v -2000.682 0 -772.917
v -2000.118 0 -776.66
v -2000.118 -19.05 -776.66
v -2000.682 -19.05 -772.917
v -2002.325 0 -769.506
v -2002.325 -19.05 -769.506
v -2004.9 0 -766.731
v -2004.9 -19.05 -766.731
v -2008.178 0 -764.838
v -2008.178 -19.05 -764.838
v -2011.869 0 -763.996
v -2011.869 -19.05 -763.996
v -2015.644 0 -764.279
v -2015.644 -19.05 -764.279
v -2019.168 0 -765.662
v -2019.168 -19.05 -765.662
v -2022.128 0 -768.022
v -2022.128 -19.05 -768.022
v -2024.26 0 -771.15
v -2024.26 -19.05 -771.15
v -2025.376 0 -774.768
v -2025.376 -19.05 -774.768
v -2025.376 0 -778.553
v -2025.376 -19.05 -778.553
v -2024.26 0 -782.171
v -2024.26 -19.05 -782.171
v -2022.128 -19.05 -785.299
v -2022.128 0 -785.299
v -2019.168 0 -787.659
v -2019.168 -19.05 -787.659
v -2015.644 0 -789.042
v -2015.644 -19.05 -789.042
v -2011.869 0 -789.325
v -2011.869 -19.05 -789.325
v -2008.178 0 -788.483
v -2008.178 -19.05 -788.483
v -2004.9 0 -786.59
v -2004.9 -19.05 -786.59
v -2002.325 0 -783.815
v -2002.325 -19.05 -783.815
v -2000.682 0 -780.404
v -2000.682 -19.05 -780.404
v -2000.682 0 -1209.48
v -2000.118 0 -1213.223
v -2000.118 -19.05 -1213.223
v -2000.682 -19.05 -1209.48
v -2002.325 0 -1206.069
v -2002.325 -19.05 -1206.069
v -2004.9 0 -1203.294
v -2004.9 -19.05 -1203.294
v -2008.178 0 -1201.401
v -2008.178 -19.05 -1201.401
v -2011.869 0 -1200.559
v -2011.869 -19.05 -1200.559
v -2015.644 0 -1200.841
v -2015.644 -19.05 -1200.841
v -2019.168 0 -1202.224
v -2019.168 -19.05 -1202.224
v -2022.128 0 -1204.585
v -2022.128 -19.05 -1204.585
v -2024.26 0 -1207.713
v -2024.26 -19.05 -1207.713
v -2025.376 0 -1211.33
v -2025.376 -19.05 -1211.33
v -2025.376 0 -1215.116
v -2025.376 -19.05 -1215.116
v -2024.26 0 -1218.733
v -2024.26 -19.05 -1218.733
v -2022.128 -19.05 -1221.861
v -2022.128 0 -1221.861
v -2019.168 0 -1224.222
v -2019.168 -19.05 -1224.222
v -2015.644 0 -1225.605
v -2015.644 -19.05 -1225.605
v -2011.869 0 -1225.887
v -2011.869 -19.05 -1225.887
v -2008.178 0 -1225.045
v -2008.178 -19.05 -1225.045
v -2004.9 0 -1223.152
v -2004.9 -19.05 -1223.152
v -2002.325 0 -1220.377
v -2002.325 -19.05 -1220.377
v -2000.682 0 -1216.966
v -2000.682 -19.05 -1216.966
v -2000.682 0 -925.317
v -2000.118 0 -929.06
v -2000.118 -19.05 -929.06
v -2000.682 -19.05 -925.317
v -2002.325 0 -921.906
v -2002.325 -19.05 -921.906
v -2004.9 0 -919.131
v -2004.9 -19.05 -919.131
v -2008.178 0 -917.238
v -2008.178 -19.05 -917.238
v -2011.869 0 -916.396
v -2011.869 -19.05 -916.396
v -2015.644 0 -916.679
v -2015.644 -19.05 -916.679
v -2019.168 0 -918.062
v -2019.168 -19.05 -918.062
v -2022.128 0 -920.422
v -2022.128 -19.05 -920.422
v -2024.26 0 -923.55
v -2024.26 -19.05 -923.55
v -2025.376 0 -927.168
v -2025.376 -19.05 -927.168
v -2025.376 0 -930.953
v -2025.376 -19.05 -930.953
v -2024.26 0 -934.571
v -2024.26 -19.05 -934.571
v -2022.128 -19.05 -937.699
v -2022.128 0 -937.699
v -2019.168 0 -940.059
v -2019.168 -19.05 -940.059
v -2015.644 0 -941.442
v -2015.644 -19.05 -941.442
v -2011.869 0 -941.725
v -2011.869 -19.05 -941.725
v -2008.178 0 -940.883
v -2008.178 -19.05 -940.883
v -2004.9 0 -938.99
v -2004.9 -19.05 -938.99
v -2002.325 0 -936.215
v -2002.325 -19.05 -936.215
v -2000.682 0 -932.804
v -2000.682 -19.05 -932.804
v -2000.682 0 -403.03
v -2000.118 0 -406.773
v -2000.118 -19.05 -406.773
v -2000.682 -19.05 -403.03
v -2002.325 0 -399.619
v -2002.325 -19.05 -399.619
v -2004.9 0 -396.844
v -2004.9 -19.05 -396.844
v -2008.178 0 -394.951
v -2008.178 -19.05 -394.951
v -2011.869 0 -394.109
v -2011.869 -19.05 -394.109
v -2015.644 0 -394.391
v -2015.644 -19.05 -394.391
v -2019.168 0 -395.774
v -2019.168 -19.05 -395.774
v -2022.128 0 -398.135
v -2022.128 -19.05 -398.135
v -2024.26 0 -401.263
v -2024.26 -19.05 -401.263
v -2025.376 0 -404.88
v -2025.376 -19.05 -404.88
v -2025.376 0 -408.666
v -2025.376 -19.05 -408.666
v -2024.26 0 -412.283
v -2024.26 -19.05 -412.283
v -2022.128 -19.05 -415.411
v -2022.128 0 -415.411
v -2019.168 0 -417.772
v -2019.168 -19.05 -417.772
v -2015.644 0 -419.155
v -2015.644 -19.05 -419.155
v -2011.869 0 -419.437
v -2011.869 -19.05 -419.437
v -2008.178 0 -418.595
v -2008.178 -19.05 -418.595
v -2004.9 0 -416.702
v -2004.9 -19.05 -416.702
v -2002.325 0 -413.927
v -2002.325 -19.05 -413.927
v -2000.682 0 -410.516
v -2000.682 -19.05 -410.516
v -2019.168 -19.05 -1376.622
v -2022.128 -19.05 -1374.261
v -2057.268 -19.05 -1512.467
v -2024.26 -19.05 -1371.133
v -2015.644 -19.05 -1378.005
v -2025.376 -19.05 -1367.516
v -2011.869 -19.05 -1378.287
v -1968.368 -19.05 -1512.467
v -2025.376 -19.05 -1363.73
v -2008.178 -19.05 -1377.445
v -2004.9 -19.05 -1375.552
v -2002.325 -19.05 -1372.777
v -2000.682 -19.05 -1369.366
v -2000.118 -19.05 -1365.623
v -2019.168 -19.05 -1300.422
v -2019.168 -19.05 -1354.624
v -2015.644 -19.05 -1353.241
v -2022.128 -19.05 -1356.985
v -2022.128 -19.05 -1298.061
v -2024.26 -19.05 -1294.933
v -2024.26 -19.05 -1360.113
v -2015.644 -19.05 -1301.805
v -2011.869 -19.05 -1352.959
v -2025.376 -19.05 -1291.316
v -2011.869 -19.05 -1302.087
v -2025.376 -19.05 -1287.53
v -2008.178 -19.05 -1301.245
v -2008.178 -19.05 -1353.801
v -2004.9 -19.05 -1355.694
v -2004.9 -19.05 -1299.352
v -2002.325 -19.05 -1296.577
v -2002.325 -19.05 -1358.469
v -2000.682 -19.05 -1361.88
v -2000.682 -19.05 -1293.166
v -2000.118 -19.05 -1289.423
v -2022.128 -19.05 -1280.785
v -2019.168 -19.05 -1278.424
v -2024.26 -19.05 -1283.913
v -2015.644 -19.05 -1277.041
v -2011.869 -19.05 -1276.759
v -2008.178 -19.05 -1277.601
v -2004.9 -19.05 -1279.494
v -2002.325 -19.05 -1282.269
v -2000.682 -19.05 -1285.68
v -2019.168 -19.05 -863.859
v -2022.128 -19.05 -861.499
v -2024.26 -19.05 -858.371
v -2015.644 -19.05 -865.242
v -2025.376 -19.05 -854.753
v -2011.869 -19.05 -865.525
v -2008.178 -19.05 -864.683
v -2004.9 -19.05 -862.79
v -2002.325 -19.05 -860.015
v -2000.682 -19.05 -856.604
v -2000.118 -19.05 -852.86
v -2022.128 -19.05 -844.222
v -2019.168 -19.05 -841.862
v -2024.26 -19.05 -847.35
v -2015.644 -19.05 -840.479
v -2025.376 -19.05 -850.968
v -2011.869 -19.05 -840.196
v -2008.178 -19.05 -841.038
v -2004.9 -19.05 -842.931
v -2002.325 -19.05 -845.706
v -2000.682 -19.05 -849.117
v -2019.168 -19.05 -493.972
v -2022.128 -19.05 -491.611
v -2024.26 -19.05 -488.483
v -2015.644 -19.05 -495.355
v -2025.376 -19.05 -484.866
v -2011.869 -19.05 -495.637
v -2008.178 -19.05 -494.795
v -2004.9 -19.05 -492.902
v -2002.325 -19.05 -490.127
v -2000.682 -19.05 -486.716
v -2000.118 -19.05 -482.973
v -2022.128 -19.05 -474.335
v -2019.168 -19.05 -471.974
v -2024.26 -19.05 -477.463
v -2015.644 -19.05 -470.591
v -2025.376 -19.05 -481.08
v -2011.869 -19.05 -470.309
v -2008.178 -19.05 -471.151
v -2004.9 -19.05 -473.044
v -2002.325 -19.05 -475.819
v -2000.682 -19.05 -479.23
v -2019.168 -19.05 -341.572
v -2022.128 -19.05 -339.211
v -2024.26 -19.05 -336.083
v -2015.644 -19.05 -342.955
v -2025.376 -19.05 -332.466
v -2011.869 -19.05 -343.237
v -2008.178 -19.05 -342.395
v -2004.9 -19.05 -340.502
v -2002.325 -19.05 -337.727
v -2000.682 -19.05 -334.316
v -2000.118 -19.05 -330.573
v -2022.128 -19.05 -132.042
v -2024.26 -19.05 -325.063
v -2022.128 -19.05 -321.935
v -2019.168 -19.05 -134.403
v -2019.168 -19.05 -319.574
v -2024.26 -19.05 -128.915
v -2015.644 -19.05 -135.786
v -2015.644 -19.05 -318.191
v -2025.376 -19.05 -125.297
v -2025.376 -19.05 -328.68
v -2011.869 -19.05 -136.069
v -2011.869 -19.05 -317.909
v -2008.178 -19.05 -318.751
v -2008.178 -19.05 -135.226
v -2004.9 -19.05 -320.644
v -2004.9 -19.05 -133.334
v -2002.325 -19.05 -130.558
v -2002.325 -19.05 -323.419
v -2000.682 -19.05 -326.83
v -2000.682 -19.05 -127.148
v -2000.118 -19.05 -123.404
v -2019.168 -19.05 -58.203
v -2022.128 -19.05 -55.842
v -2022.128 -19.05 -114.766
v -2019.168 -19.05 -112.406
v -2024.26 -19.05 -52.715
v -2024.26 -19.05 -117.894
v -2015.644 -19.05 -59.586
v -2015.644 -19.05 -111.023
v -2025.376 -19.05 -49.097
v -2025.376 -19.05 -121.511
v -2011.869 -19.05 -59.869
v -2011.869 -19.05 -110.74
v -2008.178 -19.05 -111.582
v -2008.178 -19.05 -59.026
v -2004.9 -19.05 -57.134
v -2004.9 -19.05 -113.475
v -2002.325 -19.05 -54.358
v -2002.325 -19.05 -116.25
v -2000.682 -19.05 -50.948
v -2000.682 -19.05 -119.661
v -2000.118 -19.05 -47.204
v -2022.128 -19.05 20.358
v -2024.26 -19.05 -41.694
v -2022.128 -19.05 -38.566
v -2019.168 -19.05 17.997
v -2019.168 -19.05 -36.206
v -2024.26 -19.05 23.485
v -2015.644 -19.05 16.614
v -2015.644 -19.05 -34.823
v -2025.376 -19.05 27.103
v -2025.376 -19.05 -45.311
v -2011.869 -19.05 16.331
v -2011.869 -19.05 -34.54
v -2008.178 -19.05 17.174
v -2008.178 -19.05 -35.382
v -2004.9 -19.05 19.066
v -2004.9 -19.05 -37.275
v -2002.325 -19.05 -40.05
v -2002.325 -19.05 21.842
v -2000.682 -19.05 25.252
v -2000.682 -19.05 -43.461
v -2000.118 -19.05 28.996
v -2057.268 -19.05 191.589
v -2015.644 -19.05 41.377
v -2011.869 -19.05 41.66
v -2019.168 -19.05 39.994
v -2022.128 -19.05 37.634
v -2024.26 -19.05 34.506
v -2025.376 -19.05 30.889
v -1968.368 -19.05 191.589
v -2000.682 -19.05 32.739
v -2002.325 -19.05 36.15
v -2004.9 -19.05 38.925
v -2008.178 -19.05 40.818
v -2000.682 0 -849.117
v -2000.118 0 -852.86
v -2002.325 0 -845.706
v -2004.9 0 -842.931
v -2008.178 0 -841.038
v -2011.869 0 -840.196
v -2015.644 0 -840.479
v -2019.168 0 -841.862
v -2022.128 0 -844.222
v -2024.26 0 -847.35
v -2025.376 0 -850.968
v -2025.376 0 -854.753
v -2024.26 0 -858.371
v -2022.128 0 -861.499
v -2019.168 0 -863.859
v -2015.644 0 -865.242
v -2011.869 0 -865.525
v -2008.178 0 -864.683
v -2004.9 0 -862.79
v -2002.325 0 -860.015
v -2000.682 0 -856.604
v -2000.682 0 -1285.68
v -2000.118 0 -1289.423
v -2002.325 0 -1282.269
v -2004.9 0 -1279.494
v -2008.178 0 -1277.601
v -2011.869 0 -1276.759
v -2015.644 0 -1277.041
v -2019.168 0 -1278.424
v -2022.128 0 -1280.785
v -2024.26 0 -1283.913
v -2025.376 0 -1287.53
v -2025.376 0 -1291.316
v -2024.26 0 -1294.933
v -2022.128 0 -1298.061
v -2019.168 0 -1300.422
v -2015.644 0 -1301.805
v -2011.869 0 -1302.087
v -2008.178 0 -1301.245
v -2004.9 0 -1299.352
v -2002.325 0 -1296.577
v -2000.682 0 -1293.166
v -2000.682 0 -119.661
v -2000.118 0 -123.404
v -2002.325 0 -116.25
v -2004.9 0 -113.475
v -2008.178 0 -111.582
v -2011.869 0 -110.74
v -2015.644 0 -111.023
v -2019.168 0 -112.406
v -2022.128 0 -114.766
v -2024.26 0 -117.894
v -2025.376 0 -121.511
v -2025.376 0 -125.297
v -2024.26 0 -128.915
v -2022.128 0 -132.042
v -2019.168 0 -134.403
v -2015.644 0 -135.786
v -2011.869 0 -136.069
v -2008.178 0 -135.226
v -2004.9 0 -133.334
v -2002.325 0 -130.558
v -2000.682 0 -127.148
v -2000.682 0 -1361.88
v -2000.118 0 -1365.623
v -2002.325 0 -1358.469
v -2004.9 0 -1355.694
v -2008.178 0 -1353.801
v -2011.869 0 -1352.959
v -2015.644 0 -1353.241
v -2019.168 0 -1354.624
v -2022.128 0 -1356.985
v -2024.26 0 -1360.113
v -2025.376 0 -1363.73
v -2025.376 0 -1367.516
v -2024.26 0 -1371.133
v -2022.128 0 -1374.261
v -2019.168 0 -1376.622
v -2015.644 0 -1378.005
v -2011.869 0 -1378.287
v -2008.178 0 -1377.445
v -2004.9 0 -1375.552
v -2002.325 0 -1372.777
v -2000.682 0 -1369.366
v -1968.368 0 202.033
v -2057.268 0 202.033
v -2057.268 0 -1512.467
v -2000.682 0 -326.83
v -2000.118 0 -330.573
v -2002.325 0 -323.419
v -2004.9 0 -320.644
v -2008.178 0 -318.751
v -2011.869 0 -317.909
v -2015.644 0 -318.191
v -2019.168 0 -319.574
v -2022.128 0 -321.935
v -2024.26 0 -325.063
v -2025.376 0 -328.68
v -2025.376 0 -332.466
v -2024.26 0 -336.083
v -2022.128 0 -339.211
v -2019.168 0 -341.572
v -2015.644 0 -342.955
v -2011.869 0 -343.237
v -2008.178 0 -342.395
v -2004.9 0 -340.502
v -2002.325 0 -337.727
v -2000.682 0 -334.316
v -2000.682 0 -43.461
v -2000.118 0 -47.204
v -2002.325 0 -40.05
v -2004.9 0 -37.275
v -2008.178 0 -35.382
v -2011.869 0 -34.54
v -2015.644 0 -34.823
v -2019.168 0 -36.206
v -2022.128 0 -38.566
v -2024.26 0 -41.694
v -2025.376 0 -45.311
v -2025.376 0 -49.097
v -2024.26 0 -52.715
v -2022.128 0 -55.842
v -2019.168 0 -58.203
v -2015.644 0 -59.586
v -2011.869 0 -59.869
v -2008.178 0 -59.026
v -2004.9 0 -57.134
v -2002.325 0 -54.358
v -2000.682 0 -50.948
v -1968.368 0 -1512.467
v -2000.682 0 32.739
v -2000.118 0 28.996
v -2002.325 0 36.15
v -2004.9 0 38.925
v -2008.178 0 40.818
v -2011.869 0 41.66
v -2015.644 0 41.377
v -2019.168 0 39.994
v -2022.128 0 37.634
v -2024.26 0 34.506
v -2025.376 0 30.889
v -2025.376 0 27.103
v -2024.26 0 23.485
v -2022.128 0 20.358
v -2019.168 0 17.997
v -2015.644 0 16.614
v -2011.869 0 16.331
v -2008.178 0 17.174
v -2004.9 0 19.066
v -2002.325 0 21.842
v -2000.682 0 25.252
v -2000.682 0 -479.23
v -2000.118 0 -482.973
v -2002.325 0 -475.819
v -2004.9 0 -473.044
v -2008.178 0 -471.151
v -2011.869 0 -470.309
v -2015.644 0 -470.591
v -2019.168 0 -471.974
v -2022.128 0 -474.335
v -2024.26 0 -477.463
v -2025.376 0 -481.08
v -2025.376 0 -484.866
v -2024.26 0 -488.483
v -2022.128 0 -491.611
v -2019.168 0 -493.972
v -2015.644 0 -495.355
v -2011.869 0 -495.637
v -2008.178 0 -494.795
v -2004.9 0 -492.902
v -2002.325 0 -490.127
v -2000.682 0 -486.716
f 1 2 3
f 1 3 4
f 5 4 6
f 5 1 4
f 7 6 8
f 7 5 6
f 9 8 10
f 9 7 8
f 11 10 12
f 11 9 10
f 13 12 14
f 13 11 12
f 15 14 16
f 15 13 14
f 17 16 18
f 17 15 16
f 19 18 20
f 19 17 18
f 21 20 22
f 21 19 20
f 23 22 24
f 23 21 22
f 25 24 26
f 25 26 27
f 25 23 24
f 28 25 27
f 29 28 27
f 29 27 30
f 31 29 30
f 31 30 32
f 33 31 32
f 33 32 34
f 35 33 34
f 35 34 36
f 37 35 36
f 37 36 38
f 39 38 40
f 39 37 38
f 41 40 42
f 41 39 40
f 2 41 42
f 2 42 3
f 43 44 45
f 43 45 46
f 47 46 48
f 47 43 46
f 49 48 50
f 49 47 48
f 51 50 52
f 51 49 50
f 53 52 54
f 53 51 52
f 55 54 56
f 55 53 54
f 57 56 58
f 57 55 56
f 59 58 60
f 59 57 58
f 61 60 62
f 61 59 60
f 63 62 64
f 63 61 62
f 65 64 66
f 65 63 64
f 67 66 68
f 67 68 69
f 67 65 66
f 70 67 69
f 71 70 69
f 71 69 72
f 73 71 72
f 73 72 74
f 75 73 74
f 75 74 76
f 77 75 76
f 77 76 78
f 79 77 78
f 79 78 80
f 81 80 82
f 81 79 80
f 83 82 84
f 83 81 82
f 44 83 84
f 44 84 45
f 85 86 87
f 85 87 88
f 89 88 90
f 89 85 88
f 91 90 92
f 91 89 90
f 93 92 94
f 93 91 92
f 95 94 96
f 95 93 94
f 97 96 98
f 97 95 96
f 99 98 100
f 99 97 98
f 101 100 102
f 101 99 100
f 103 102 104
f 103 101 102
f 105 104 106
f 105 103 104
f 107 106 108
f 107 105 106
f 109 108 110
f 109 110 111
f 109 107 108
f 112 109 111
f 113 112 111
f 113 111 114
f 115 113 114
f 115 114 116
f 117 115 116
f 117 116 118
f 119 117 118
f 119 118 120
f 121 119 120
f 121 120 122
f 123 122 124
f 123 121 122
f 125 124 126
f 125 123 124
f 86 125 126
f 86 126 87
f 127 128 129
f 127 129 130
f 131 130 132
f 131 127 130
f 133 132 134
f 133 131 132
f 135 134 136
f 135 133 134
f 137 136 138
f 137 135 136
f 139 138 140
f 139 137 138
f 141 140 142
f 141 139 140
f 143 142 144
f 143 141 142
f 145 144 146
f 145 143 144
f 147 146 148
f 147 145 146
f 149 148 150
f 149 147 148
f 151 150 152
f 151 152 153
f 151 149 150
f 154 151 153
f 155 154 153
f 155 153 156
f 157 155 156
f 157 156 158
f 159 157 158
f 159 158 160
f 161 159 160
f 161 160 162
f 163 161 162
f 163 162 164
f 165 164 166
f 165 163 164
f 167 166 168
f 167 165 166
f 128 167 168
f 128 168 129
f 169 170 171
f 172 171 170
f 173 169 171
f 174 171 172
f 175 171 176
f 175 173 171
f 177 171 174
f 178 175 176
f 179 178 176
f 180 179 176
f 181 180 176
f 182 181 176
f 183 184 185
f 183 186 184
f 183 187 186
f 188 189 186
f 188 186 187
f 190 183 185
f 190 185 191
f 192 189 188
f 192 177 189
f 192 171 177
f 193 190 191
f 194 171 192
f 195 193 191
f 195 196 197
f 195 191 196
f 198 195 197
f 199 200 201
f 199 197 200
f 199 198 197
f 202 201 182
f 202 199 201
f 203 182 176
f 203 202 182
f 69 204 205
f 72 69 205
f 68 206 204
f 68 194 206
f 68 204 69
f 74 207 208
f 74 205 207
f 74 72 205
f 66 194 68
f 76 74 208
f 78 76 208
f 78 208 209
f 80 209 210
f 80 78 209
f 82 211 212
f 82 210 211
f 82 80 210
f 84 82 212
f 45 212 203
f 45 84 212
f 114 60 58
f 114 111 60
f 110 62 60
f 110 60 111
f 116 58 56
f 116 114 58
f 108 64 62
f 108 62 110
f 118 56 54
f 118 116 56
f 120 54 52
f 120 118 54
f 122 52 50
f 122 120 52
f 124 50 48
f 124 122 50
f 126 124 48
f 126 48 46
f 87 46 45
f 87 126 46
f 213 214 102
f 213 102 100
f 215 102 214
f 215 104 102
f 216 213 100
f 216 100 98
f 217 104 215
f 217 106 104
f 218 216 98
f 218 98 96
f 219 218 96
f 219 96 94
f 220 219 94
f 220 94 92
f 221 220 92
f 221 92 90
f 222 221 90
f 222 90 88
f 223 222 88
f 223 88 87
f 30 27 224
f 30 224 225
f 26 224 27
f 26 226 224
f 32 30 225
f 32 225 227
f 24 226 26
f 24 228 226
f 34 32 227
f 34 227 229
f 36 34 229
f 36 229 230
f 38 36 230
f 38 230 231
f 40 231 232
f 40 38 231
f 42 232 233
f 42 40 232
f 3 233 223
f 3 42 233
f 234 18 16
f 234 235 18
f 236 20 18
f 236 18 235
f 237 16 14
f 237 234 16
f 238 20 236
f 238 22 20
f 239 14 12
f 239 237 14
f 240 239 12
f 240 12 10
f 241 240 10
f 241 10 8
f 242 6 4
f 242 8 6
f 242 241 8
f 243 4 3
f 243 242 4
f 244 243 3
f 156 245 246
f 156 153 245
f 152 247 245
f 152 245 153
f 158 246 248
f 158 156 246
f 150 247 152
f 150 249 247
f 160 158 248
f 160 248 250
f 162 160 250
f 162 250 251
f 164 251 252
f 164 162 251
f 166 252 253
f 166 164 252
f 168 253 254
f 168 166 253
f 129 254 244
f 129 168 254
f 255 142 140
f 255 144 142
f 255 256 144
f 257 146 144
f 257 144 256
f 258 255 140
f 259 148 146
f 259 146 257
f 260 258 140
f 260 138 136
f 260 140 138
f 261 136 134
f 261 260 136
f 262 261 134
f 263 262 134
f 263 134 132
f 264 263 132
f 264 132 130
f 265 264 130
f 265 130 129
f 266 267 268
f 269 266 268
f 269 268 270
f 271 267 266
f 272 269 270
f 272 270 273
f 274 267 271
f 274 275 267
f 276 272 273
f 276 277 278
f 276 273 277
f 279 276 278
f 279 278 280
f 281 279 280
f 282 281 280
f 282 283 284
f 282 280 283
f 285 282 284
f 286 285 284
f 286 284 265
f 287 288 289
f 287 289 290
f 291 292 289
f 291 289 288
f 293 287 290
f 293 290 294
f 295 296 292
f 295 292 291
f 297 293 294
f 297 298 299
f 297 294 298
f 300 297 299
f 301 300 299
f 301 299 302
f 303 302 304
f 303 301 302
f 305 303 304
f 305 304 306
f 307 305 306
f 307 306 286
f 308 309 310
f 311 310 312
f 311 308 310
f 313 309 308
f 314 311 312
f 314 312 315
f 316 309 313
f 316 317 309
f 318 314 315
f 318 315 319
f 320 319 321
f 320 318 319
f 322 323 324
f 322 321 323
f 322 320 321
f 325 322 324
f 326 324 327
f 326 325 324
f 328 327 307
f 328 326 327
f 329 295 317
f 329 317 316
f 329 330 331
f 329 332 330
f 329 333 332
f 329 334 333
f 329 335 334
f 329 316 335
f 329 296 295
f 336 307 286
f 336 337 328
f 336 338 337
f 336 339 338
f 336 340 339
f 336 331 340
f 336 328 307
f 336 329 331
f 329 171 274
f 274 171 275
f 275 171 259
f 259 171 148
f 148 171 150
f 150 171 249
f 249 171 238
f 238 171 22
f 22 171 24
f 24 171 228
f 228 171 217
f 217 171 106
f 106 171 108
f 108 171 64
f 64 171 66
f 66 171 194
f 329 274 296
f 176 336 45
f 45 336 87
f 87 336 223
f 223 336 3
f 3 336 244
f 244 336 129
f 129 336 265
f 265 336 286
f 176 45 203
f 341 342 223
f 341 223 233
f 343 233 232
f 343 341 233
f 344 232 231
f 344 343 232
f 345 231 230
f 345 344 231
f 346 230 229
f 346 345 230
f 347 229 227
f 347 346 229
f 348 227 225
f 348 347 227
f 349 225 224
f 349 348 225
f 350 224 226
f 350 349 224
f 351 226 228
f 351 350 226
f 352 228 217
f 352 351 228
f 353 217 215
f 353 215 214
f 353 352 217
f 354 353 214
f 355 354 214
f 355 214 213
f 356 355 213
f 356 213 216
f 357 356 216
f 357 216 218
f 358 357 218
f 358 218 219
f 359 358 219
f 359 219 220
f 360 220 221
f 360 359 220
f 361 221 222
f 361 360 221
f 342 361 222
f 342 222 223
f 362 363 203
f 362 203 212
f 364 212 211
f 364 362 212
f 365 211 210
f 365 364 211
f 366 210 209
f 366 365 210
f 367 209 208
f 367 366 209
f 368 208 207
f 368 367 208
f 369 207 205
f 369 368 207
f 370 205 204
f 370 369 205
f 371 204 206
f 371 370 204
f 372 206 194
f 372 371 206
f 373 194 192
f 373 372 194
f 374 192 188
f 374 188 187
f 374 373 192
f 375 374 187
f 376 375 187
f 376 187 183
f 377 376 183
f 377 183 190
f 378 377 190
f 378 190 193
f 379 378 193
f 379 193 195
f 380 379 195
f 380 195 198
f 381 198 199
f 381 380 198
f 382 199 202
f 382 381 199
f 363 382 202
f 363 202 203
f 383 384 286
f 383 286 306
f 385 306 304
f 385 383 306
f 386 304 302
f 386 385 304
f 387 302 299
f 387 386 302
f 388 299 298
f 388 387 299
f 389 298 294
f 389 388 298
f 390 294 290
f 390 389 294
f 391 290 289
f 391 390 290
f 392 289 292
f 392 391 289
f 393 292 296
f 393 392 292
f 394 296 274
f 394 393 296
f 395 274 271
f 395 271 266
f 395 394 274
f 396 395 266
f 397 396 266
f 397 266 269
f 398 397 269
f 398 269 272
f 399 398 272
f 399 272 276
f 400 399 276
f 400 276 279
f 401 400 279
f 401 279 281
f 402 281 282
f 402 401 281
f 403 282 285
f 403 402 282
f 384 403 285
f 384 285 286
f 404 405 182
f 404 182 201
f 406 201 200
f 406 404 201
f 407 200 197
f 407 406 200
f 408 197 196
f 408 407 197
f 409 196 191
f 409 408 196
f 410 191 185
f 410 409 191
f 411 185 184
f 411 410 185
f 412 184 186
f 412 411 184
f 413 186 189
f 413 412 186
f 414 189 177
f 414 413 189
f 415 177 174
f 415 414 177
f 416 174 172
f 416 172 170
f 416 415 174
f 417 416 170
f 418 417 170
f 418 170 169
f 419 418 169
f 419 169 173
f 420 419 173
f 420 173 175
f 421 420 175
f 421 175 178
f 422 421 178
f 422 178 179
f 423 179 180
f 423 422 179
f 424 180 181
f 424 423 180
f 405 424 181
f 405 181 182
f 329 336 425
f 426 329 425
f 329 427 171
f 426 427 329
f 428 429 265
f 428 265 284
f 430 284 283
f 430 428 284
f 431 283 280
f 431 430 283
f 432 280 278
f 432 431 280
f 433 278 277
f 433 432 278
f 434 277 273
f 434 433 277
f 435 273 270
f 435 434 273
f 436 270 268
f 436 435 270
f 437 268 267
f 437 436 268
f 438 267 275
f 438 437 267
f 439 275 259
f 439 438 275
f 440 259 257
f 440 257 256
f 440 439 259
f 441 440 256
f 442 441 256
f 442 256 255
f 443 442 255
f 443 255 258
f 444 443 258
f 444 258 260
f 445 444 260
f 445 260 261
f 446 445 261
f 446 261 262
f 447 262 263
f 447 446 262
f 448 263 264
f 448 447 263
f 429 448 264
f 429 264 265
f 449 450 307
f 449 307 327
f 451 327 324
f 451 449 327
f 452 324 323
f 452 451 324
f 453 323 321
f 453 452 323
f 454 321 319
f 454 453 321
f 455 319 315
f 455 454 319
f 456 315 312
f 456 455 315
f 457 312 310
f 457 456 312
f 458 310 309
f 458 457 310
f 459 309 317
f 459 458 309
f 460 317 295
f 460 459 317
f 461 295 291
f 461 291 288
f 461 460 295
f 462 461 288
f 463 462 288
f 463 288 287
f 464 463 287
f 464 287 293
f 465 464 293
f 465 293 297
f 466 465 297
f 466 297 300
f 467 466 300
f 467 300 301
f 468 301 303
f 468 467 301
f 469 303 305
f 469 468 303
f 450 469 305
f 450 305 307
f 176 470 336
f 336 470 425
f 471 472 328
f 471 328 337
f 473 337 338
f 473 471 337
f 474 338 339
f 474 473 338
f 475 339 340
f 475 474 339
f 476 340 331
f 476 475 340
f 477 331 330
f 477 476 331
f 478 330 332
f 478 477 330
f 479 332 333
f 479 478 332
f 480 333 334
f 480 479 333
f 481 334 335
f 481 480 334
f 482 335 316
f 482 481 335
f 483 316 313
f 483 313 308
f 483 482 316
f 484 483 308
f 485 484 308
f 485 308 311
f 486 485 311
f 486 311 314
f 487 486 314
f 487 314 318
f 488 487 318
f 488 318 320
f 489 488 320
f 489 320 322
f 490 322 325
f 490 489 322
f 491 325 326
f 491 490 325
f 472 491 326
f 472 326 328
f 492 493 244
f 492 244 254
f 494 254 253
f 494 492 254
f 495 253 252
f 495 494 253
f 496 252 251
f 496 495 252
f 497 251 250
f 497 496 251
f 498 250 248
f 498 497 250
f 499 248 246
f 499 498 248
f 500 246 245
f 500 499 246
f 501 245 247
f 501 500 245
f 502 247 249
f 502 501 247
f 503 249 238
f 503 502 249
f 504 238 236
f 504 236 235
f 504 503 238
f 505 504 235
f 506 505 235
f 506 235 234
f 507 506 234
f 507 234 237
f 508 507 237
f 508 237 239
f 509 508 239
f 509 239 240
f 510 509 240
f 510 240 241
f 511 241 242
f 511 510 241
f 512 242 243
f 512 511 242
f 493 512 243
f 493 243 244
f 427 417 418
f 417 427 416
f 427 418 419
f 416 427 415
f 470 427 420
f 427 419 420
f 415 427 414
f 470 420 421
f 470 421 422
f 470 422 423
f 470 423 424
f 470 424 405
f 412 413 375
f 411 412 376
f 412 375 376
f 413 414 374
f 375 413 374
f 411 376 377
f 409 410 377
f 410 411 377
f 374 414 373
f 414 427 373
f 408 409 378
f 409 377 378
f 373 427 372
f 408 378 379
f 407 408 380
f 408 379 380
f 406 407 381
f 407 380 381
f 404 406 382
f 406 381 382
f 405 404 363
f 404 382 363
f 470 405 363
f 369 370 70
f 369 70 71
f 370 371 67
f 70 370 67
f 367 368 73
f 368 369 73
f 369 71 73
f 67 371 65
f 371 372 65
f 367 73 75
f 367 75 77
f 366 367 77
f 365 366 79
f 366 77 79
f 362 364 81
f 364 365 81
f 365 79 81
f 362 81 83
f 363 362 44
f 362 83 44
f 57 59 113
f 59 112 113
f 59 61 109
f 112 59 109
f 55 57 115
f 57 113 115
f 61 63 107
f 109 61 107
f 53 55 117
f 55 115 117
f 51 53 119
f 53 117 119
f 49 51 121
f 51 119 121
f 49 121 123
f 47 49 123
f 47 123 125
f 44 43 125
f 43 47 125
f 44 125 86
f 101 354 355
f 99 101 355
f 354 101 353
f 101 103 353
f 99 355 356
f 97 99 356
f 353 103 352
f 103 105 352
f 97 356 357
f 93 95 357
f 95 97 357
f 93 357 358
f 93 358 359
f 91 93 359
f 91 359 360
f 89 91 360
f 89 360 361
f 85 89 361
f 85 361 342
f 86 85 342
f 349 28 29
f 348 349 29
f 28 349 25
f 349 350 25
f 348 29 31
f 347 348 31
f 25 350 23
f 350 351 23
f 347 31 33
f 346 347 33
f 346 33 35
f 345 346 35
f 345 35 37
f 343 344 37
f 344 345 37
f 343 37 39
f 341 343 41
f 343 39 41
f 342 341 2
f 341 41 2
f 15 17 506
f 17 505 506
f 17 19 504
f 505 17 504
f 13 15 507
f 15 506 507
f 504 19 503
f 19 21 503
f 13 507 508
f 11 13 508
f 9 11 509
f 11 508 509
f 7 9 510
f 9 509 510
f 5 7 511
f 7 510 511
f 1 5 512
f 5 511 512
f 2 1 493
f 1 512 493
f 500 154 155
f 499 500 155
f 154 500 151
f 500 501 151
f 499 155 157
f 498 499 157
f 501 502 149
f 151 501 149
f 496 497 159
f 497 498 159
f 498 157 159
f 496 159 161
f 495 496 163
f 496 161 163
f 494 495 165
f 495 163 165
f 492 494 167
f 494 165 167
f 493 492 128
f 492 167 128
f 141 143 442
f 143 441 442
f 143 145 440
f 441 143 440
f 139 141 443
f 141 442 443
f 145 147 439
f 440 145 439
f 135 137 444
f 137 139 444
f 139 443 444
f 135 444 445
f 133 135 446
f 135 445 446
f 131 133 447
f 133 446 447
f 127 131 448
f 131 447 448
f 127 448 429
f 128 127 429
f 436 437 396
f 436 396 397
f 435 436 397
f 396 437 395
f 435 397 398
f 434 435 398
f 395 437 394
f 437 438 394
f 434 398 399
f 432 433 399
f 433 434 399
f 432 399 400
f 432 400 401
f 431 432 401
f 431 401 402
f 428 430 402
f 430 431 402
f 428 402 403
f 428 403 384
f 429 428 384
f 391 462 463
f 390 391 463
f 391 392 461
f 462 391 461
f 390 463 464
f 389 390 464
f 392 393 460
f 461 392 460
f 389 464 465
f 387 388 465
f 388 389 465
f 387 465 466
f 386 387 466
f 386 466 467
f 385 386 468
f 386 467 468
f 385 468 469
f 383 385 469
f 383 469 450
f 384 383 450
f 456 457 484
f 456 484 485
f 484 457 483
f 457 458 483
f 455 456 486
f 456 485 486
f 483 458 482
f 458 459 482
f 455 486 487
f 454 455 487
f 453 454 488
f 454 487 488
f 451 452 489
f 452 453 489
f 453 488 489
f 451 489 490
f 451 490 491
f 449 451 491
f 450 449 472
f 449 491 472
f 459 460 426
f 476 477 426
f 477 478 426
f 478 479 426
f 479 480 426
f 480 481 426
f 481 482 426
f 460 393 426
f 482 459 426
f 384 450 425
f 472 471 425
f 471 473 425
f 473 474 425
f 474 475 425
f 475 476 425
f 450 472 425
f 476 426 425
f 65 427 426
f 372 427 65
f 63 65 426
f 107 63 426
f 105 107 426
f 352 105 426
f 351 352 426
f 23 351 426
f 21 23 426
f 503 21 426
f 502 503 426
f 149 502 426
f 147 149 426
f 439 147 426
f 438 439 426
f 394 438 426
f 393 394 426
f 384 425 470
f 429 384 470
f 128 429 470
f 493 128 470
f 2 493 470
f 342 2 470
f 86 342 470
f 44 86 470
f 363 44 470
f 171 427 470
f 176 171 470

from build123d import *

# Parameters (mm, degrees)
F0_W     = 88.9
F0_H     = 1714.5
F0_R     = 12.7
F1_DEPTH = 19.05
F3_DEPTH = 88.901


with BuildPart() as f1:
    # F0 (on Front) → F1 (new body)
    with BuildSketch(Plane.XZ):
        with Locations((-2012.818174, -655.216749)):
            Rectangle(F0_W, F0_H)
        with Locations((-2012.818174, -1365.622999)):
            Circle(F0_R, mode=Mode.SUBTRACT)
        with Locations((-2012.818174, -1289.422999)):
            Circle(F0_R, mode=Mode.SUBTRACT)
        with Locations((-2012.818174, -1213.222999)):
            Circle(F0_R, mode=Mode.SUBTRACT)
        with Locations((-2012.818174, -929.060499)):
            Circle(F0_R, mode=Mode.SUBTRACT)
        with Locations((-2012.818174, -852.860499)):
            Circle(F0_R, mode=Mode.SUBTRACT)
        with Locations((-2012.818174, -776.660499)):
            Circle(F0_R, mode=Mode.SUBTRACT)
        with Locations((-2012.818174, -482.972999)):
            Circle(F0_R, mode=Mode.SUBTRACT)
        with Locations((-2012.818174, -406.772999)):
            Circle(F0_R, mode=Mode.SUBTRACT)
        with Locations((-2012.818174, -330.572999)):
            Circle(F0_R, mode=Mode.SUBTRACT)
        with Locations((-2012.818174, -123.404249)):
            Circle(F0_R, mode=Mode.SUBTRACT)
        with Locations((-2012.818174, -47.204249)):
            Circle(F0_R, mode=Mode.SUBTRACT)
        with Locations((-2012.818174, 28.995751)):
            Circle(F0_R, mode=Mode.SUBTRACT)
    extrude(amount=F1_DEPTH)

    # F2 (on face) → F3 (cut, through all)
    with BuildSketch(Plane.YZ.offset(-1968.368174)):
        Polygon((-19.05, 191.589271), (0, 202.033251), (-19.05, 202.033251), align=None)
    extrude(amount=-F3_DEPTH, mode=Mode.SUBTRACT)


solid = f1.part
